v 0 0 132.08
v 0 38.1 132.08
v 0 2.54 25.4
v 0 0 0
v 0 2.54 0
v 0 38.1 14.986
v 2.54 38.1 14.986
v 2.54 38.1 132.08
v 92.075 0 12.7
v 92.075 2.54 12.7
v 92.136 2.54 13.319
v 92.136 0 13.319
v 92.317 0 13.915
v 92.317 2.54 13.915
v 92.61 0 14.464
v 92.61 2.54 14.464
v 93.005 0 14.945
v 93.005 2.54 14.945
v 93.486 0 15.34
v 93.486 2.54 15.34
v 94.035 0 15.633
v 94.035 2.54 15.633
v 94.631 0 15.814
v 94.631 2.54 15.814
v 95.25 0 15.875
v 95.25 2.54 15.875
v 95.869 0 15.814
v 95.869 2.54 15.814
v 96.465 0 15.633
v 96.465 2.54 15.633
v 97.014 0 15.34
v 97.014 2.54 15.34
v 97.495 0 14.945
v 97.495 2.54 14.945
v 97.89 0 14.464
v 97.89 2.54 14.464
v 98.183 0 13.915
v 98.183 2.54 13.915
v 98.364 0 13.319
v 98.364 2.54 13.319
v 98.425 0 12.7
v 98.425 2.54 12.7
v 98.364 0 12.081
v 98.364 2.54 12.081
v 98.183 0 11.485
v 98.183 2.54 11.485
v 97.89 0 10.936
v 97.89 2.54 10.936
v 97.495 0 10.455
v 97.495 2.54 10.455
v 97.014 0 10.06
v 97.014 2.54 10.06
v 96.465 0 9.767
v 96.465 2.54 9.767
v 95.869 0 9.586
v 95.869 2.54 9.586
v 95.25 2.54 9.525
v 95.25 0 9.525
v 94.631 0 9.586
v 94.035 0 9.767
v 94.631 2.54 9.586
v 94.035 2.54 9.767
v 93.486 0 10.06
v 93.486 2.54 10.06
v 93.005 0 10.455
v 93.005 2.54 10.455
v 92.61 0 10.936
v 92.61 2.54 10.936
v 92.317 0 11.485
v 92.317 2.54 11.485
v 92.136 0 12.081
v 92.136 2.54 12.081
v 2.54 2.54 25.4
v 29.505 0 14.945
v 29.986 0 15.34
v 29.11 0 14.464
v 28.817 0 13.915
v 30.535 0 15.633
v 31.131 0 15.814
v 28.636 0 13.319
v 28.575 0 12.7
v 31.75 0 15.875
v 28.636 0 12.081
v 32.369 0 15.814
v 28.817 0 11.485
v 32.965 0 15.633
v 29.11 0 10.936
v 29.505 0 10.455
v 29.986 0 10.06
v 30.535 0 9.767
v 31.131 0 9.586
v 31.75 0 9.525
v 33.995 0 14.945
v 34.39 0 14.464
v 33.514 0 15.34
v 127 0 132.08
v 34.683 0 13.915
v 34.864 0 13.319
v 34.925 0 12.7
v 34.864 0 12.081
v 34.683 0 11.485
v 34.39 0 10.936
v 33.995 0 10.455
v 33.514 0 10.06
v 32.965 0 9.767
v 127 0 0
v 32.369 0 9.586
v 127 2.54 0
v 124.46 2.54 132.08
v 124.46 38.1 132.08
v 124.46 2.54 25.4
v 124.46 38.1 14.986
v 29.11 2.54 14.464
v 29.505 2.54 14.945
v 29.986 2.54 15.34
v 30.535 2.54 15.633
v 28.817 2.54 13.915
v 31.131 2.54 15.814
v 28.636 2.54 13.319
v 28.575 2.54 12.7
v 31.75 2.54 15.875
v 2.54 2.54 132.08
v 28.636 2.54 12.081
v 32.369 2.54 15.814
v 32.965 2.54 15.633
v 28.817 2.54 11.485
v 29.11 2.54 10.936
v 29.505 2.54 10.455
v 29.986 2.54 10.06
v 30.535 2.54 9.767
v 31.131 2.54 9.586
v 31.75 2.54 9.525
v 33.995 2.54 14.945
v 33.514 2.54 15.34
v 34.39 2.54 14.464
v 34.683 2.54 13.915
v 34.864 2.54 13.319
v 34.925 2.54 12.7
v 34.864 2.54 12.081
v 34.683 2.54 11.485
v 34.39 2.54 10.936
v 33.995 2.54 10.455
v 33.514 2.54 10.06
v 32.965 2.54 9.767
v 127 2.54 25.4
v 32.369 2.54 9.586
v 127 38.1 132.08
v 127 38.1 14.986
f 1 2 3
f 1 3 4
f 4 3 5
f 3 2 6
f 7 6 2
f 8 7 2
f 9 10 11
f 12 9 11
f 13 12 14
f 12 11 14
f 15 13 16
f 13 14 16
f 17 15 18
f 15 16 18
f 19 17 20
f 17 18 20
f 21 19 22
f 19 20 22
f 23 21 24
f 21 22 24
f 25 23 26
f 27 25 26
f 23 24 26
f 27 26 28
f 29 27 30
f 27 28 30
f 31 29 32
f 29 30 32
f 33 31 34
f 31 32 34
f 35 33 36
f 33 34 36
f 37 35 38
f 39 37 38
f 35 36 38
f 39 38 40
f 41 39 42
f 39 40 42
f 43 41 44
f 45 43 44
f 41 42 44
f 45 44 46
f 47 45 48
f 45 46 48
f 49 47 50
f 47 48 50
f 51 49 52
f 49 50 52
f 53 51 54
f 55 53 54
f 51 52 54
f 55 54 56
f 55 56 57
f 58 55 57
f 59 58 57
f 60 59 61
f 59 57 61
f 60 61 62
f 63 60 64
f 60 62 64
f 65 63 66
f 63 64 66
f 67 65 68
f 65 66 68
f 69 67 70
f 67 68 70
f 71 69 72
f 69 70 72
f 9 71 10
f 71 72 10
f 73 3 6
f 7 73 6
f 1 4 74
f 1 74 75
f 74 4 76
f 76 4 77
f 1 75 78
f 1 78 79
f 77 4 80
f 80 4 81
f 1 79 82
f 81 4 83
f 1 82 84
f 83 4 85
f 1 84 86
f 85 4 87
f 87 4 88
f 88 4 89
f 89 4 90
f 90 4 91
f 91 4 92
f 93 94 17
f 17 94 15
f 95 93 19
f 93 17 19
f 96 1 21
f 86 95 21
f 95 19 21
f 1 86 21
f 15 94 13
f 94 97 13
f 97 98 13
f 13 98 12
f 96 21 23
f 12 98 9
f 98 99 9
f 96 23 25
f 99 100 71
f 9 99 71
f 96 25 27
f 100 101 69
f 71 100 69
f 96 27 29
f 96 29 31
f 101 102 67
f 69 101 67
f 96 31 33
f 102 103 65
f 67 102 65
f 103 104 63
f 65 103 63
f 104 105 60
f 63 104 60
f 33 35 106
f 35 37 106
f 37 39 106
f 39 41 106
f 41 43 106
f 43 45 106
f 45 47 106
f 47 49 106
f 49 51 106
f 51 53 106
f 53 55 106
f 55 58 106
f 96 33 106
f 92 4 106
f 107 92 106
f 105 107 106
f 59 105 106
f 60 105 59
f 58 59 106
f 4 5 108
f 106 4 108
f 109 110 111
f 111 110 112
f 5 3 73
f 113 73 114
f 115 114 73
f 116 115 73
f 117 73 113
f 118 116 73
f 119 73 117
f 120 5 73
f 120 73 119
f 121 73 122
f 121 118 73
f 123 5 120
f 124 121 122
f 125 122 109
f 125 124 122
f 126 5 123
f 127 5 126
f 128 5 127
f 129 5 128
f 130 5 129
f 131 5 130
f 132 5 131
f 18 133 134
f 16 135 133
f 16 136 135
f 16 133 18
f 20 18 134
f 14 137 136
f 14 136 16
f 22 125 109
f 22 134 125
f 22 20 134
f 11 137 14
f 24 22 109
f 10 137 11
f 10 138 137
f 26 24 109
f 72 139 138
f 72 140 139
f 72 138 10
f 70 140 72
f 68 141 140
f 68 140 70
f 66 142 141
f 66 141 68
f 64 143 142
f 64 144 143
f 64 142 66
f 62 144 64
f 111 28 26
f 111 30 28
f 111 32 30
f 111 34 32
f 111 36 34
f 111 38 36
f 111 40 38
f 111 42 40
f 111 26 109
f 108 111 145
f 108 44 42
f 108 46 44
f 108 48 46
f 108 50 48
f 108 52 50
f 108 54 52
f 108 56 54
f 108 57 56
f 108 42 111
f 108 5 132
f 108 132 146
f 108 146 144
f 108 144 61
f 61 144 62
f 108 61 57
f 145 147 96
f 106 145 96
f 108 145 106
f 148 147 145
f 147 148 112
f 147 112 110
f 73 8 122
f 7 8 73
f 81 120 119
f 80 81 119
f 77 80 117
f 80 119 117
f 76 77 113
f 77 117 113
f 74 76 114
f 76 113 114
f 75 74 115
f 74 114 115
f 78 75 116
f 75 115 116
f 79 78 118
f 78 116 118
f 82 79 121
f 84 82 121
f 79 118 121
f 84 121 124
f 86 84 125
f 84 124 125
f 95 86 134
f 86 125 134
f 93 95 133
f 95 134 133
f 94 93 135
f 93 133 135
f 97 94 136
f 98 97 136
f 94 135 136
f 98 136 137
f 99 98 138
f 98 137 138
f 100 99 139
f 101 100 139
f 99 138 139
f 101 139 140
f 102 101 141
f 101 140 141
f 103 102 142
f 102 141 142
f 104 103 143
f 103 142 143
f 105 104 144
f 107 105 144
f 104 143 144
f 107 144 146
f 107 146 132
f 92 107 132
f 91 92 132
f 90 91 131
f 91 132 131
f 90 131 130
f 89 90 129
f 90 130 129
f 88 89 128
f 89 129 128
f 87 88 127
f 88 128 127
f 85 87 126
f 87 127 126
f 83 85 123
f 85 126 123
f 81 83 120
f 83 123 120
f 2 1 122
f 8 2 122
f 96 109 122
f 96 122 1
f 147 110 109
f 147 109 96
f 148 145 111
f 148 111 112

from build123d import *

# Parameters (mm, degrees)
SKETCH1_W           = 127
SKETCH1_H           = 38.1
BOSS_EXTRUDE1_DEPTH = 132.08
CUT_EXTRUDE1_DEPTH  = 35.56
BOSS_EXTRUDE2_DEPTH = 2.54
BOSS_EXTRUDE3_START = 127
BOSS_EXTRUDE3_DEPTH = 2.54
SKETCH4_R           = 3.175
CUT_EXTRUDE2_DEPTH  = 2.54


with BuildPart() as part:
    # Sketch1 → Boss-Extrude1 (new body)
    with BuildSketch(Plane.XY):
        with Locations((63.5, 19.05)):
            Rectangle(SKETCH1_W, SKETCH1_H)
    extrude(amount=BOSS_EXTRUDE1_DEPTH)

    # Sketch2 → Cut-Extrude1 (cut)
    with BuildSketch(Plane(origin=(0, 38.1, 0), x_dir=(1, 0, 0), z_dir=(0, 1, 0))):
        Polygon((0, -25.4), (2.54, -25.4), (2.54, -132.08), (124.46, -132.08), (124.46, -25.4), (127, -25.4), (127, 0), (0, 0), align=None)
    extrude(amount=-CUT_EXTRUDE1_DEPTH, mode=Mode.SUBTRACT)

    # Sketch3 → Boss-Extrude2 (add)
    with BuildSketch(Plane(origin=(0, 0, 0), x_dir=(0, 0, -1), z_dir=(1, 0, 0))):
        Polygon((-25.4, 2.54), (-14.986, 38.1), (-25.4, 38.1), align=None)
    extrude(amount=BOSS_EXTRUDE2_DEPTH)

    # Sketch3<2> → Boss-Extrude3 (add)
    with BuildSketch(Plane(origin=(0, 0, 0), x_dir=(0, 0, -1), z_dir=(1, 0, 0)).offset(BOSS_EXTRUDE3_START)):
        Polygon((-25.4, 2.54), (-14.986, 38.1), (-25.4, 38.1), align=None)
    extrude(amount=-BOSS_EXTRUDE3_DEPTH)

    # Sketch4 → Cut-Extrude2 (cut)
    with BuildSketch(Plane(origin=(0, 2.54, 0), x_dir=(1, 0, 0), z_dir=(0, 1, 0))):
        with Locations(Location((31.75, -12.7, 0), (0, 0, 180))):
            Circle(SKETCH4_R)
        with Locations(Location((95.25, -12.7, 0), (0, 0, 180))):
            Circle(SKETCH4_R)
    extrude(amount=-CUT_EXTRUDE2_DEPTH, mode=Mode.SUBTRACT)


solid = part.part
